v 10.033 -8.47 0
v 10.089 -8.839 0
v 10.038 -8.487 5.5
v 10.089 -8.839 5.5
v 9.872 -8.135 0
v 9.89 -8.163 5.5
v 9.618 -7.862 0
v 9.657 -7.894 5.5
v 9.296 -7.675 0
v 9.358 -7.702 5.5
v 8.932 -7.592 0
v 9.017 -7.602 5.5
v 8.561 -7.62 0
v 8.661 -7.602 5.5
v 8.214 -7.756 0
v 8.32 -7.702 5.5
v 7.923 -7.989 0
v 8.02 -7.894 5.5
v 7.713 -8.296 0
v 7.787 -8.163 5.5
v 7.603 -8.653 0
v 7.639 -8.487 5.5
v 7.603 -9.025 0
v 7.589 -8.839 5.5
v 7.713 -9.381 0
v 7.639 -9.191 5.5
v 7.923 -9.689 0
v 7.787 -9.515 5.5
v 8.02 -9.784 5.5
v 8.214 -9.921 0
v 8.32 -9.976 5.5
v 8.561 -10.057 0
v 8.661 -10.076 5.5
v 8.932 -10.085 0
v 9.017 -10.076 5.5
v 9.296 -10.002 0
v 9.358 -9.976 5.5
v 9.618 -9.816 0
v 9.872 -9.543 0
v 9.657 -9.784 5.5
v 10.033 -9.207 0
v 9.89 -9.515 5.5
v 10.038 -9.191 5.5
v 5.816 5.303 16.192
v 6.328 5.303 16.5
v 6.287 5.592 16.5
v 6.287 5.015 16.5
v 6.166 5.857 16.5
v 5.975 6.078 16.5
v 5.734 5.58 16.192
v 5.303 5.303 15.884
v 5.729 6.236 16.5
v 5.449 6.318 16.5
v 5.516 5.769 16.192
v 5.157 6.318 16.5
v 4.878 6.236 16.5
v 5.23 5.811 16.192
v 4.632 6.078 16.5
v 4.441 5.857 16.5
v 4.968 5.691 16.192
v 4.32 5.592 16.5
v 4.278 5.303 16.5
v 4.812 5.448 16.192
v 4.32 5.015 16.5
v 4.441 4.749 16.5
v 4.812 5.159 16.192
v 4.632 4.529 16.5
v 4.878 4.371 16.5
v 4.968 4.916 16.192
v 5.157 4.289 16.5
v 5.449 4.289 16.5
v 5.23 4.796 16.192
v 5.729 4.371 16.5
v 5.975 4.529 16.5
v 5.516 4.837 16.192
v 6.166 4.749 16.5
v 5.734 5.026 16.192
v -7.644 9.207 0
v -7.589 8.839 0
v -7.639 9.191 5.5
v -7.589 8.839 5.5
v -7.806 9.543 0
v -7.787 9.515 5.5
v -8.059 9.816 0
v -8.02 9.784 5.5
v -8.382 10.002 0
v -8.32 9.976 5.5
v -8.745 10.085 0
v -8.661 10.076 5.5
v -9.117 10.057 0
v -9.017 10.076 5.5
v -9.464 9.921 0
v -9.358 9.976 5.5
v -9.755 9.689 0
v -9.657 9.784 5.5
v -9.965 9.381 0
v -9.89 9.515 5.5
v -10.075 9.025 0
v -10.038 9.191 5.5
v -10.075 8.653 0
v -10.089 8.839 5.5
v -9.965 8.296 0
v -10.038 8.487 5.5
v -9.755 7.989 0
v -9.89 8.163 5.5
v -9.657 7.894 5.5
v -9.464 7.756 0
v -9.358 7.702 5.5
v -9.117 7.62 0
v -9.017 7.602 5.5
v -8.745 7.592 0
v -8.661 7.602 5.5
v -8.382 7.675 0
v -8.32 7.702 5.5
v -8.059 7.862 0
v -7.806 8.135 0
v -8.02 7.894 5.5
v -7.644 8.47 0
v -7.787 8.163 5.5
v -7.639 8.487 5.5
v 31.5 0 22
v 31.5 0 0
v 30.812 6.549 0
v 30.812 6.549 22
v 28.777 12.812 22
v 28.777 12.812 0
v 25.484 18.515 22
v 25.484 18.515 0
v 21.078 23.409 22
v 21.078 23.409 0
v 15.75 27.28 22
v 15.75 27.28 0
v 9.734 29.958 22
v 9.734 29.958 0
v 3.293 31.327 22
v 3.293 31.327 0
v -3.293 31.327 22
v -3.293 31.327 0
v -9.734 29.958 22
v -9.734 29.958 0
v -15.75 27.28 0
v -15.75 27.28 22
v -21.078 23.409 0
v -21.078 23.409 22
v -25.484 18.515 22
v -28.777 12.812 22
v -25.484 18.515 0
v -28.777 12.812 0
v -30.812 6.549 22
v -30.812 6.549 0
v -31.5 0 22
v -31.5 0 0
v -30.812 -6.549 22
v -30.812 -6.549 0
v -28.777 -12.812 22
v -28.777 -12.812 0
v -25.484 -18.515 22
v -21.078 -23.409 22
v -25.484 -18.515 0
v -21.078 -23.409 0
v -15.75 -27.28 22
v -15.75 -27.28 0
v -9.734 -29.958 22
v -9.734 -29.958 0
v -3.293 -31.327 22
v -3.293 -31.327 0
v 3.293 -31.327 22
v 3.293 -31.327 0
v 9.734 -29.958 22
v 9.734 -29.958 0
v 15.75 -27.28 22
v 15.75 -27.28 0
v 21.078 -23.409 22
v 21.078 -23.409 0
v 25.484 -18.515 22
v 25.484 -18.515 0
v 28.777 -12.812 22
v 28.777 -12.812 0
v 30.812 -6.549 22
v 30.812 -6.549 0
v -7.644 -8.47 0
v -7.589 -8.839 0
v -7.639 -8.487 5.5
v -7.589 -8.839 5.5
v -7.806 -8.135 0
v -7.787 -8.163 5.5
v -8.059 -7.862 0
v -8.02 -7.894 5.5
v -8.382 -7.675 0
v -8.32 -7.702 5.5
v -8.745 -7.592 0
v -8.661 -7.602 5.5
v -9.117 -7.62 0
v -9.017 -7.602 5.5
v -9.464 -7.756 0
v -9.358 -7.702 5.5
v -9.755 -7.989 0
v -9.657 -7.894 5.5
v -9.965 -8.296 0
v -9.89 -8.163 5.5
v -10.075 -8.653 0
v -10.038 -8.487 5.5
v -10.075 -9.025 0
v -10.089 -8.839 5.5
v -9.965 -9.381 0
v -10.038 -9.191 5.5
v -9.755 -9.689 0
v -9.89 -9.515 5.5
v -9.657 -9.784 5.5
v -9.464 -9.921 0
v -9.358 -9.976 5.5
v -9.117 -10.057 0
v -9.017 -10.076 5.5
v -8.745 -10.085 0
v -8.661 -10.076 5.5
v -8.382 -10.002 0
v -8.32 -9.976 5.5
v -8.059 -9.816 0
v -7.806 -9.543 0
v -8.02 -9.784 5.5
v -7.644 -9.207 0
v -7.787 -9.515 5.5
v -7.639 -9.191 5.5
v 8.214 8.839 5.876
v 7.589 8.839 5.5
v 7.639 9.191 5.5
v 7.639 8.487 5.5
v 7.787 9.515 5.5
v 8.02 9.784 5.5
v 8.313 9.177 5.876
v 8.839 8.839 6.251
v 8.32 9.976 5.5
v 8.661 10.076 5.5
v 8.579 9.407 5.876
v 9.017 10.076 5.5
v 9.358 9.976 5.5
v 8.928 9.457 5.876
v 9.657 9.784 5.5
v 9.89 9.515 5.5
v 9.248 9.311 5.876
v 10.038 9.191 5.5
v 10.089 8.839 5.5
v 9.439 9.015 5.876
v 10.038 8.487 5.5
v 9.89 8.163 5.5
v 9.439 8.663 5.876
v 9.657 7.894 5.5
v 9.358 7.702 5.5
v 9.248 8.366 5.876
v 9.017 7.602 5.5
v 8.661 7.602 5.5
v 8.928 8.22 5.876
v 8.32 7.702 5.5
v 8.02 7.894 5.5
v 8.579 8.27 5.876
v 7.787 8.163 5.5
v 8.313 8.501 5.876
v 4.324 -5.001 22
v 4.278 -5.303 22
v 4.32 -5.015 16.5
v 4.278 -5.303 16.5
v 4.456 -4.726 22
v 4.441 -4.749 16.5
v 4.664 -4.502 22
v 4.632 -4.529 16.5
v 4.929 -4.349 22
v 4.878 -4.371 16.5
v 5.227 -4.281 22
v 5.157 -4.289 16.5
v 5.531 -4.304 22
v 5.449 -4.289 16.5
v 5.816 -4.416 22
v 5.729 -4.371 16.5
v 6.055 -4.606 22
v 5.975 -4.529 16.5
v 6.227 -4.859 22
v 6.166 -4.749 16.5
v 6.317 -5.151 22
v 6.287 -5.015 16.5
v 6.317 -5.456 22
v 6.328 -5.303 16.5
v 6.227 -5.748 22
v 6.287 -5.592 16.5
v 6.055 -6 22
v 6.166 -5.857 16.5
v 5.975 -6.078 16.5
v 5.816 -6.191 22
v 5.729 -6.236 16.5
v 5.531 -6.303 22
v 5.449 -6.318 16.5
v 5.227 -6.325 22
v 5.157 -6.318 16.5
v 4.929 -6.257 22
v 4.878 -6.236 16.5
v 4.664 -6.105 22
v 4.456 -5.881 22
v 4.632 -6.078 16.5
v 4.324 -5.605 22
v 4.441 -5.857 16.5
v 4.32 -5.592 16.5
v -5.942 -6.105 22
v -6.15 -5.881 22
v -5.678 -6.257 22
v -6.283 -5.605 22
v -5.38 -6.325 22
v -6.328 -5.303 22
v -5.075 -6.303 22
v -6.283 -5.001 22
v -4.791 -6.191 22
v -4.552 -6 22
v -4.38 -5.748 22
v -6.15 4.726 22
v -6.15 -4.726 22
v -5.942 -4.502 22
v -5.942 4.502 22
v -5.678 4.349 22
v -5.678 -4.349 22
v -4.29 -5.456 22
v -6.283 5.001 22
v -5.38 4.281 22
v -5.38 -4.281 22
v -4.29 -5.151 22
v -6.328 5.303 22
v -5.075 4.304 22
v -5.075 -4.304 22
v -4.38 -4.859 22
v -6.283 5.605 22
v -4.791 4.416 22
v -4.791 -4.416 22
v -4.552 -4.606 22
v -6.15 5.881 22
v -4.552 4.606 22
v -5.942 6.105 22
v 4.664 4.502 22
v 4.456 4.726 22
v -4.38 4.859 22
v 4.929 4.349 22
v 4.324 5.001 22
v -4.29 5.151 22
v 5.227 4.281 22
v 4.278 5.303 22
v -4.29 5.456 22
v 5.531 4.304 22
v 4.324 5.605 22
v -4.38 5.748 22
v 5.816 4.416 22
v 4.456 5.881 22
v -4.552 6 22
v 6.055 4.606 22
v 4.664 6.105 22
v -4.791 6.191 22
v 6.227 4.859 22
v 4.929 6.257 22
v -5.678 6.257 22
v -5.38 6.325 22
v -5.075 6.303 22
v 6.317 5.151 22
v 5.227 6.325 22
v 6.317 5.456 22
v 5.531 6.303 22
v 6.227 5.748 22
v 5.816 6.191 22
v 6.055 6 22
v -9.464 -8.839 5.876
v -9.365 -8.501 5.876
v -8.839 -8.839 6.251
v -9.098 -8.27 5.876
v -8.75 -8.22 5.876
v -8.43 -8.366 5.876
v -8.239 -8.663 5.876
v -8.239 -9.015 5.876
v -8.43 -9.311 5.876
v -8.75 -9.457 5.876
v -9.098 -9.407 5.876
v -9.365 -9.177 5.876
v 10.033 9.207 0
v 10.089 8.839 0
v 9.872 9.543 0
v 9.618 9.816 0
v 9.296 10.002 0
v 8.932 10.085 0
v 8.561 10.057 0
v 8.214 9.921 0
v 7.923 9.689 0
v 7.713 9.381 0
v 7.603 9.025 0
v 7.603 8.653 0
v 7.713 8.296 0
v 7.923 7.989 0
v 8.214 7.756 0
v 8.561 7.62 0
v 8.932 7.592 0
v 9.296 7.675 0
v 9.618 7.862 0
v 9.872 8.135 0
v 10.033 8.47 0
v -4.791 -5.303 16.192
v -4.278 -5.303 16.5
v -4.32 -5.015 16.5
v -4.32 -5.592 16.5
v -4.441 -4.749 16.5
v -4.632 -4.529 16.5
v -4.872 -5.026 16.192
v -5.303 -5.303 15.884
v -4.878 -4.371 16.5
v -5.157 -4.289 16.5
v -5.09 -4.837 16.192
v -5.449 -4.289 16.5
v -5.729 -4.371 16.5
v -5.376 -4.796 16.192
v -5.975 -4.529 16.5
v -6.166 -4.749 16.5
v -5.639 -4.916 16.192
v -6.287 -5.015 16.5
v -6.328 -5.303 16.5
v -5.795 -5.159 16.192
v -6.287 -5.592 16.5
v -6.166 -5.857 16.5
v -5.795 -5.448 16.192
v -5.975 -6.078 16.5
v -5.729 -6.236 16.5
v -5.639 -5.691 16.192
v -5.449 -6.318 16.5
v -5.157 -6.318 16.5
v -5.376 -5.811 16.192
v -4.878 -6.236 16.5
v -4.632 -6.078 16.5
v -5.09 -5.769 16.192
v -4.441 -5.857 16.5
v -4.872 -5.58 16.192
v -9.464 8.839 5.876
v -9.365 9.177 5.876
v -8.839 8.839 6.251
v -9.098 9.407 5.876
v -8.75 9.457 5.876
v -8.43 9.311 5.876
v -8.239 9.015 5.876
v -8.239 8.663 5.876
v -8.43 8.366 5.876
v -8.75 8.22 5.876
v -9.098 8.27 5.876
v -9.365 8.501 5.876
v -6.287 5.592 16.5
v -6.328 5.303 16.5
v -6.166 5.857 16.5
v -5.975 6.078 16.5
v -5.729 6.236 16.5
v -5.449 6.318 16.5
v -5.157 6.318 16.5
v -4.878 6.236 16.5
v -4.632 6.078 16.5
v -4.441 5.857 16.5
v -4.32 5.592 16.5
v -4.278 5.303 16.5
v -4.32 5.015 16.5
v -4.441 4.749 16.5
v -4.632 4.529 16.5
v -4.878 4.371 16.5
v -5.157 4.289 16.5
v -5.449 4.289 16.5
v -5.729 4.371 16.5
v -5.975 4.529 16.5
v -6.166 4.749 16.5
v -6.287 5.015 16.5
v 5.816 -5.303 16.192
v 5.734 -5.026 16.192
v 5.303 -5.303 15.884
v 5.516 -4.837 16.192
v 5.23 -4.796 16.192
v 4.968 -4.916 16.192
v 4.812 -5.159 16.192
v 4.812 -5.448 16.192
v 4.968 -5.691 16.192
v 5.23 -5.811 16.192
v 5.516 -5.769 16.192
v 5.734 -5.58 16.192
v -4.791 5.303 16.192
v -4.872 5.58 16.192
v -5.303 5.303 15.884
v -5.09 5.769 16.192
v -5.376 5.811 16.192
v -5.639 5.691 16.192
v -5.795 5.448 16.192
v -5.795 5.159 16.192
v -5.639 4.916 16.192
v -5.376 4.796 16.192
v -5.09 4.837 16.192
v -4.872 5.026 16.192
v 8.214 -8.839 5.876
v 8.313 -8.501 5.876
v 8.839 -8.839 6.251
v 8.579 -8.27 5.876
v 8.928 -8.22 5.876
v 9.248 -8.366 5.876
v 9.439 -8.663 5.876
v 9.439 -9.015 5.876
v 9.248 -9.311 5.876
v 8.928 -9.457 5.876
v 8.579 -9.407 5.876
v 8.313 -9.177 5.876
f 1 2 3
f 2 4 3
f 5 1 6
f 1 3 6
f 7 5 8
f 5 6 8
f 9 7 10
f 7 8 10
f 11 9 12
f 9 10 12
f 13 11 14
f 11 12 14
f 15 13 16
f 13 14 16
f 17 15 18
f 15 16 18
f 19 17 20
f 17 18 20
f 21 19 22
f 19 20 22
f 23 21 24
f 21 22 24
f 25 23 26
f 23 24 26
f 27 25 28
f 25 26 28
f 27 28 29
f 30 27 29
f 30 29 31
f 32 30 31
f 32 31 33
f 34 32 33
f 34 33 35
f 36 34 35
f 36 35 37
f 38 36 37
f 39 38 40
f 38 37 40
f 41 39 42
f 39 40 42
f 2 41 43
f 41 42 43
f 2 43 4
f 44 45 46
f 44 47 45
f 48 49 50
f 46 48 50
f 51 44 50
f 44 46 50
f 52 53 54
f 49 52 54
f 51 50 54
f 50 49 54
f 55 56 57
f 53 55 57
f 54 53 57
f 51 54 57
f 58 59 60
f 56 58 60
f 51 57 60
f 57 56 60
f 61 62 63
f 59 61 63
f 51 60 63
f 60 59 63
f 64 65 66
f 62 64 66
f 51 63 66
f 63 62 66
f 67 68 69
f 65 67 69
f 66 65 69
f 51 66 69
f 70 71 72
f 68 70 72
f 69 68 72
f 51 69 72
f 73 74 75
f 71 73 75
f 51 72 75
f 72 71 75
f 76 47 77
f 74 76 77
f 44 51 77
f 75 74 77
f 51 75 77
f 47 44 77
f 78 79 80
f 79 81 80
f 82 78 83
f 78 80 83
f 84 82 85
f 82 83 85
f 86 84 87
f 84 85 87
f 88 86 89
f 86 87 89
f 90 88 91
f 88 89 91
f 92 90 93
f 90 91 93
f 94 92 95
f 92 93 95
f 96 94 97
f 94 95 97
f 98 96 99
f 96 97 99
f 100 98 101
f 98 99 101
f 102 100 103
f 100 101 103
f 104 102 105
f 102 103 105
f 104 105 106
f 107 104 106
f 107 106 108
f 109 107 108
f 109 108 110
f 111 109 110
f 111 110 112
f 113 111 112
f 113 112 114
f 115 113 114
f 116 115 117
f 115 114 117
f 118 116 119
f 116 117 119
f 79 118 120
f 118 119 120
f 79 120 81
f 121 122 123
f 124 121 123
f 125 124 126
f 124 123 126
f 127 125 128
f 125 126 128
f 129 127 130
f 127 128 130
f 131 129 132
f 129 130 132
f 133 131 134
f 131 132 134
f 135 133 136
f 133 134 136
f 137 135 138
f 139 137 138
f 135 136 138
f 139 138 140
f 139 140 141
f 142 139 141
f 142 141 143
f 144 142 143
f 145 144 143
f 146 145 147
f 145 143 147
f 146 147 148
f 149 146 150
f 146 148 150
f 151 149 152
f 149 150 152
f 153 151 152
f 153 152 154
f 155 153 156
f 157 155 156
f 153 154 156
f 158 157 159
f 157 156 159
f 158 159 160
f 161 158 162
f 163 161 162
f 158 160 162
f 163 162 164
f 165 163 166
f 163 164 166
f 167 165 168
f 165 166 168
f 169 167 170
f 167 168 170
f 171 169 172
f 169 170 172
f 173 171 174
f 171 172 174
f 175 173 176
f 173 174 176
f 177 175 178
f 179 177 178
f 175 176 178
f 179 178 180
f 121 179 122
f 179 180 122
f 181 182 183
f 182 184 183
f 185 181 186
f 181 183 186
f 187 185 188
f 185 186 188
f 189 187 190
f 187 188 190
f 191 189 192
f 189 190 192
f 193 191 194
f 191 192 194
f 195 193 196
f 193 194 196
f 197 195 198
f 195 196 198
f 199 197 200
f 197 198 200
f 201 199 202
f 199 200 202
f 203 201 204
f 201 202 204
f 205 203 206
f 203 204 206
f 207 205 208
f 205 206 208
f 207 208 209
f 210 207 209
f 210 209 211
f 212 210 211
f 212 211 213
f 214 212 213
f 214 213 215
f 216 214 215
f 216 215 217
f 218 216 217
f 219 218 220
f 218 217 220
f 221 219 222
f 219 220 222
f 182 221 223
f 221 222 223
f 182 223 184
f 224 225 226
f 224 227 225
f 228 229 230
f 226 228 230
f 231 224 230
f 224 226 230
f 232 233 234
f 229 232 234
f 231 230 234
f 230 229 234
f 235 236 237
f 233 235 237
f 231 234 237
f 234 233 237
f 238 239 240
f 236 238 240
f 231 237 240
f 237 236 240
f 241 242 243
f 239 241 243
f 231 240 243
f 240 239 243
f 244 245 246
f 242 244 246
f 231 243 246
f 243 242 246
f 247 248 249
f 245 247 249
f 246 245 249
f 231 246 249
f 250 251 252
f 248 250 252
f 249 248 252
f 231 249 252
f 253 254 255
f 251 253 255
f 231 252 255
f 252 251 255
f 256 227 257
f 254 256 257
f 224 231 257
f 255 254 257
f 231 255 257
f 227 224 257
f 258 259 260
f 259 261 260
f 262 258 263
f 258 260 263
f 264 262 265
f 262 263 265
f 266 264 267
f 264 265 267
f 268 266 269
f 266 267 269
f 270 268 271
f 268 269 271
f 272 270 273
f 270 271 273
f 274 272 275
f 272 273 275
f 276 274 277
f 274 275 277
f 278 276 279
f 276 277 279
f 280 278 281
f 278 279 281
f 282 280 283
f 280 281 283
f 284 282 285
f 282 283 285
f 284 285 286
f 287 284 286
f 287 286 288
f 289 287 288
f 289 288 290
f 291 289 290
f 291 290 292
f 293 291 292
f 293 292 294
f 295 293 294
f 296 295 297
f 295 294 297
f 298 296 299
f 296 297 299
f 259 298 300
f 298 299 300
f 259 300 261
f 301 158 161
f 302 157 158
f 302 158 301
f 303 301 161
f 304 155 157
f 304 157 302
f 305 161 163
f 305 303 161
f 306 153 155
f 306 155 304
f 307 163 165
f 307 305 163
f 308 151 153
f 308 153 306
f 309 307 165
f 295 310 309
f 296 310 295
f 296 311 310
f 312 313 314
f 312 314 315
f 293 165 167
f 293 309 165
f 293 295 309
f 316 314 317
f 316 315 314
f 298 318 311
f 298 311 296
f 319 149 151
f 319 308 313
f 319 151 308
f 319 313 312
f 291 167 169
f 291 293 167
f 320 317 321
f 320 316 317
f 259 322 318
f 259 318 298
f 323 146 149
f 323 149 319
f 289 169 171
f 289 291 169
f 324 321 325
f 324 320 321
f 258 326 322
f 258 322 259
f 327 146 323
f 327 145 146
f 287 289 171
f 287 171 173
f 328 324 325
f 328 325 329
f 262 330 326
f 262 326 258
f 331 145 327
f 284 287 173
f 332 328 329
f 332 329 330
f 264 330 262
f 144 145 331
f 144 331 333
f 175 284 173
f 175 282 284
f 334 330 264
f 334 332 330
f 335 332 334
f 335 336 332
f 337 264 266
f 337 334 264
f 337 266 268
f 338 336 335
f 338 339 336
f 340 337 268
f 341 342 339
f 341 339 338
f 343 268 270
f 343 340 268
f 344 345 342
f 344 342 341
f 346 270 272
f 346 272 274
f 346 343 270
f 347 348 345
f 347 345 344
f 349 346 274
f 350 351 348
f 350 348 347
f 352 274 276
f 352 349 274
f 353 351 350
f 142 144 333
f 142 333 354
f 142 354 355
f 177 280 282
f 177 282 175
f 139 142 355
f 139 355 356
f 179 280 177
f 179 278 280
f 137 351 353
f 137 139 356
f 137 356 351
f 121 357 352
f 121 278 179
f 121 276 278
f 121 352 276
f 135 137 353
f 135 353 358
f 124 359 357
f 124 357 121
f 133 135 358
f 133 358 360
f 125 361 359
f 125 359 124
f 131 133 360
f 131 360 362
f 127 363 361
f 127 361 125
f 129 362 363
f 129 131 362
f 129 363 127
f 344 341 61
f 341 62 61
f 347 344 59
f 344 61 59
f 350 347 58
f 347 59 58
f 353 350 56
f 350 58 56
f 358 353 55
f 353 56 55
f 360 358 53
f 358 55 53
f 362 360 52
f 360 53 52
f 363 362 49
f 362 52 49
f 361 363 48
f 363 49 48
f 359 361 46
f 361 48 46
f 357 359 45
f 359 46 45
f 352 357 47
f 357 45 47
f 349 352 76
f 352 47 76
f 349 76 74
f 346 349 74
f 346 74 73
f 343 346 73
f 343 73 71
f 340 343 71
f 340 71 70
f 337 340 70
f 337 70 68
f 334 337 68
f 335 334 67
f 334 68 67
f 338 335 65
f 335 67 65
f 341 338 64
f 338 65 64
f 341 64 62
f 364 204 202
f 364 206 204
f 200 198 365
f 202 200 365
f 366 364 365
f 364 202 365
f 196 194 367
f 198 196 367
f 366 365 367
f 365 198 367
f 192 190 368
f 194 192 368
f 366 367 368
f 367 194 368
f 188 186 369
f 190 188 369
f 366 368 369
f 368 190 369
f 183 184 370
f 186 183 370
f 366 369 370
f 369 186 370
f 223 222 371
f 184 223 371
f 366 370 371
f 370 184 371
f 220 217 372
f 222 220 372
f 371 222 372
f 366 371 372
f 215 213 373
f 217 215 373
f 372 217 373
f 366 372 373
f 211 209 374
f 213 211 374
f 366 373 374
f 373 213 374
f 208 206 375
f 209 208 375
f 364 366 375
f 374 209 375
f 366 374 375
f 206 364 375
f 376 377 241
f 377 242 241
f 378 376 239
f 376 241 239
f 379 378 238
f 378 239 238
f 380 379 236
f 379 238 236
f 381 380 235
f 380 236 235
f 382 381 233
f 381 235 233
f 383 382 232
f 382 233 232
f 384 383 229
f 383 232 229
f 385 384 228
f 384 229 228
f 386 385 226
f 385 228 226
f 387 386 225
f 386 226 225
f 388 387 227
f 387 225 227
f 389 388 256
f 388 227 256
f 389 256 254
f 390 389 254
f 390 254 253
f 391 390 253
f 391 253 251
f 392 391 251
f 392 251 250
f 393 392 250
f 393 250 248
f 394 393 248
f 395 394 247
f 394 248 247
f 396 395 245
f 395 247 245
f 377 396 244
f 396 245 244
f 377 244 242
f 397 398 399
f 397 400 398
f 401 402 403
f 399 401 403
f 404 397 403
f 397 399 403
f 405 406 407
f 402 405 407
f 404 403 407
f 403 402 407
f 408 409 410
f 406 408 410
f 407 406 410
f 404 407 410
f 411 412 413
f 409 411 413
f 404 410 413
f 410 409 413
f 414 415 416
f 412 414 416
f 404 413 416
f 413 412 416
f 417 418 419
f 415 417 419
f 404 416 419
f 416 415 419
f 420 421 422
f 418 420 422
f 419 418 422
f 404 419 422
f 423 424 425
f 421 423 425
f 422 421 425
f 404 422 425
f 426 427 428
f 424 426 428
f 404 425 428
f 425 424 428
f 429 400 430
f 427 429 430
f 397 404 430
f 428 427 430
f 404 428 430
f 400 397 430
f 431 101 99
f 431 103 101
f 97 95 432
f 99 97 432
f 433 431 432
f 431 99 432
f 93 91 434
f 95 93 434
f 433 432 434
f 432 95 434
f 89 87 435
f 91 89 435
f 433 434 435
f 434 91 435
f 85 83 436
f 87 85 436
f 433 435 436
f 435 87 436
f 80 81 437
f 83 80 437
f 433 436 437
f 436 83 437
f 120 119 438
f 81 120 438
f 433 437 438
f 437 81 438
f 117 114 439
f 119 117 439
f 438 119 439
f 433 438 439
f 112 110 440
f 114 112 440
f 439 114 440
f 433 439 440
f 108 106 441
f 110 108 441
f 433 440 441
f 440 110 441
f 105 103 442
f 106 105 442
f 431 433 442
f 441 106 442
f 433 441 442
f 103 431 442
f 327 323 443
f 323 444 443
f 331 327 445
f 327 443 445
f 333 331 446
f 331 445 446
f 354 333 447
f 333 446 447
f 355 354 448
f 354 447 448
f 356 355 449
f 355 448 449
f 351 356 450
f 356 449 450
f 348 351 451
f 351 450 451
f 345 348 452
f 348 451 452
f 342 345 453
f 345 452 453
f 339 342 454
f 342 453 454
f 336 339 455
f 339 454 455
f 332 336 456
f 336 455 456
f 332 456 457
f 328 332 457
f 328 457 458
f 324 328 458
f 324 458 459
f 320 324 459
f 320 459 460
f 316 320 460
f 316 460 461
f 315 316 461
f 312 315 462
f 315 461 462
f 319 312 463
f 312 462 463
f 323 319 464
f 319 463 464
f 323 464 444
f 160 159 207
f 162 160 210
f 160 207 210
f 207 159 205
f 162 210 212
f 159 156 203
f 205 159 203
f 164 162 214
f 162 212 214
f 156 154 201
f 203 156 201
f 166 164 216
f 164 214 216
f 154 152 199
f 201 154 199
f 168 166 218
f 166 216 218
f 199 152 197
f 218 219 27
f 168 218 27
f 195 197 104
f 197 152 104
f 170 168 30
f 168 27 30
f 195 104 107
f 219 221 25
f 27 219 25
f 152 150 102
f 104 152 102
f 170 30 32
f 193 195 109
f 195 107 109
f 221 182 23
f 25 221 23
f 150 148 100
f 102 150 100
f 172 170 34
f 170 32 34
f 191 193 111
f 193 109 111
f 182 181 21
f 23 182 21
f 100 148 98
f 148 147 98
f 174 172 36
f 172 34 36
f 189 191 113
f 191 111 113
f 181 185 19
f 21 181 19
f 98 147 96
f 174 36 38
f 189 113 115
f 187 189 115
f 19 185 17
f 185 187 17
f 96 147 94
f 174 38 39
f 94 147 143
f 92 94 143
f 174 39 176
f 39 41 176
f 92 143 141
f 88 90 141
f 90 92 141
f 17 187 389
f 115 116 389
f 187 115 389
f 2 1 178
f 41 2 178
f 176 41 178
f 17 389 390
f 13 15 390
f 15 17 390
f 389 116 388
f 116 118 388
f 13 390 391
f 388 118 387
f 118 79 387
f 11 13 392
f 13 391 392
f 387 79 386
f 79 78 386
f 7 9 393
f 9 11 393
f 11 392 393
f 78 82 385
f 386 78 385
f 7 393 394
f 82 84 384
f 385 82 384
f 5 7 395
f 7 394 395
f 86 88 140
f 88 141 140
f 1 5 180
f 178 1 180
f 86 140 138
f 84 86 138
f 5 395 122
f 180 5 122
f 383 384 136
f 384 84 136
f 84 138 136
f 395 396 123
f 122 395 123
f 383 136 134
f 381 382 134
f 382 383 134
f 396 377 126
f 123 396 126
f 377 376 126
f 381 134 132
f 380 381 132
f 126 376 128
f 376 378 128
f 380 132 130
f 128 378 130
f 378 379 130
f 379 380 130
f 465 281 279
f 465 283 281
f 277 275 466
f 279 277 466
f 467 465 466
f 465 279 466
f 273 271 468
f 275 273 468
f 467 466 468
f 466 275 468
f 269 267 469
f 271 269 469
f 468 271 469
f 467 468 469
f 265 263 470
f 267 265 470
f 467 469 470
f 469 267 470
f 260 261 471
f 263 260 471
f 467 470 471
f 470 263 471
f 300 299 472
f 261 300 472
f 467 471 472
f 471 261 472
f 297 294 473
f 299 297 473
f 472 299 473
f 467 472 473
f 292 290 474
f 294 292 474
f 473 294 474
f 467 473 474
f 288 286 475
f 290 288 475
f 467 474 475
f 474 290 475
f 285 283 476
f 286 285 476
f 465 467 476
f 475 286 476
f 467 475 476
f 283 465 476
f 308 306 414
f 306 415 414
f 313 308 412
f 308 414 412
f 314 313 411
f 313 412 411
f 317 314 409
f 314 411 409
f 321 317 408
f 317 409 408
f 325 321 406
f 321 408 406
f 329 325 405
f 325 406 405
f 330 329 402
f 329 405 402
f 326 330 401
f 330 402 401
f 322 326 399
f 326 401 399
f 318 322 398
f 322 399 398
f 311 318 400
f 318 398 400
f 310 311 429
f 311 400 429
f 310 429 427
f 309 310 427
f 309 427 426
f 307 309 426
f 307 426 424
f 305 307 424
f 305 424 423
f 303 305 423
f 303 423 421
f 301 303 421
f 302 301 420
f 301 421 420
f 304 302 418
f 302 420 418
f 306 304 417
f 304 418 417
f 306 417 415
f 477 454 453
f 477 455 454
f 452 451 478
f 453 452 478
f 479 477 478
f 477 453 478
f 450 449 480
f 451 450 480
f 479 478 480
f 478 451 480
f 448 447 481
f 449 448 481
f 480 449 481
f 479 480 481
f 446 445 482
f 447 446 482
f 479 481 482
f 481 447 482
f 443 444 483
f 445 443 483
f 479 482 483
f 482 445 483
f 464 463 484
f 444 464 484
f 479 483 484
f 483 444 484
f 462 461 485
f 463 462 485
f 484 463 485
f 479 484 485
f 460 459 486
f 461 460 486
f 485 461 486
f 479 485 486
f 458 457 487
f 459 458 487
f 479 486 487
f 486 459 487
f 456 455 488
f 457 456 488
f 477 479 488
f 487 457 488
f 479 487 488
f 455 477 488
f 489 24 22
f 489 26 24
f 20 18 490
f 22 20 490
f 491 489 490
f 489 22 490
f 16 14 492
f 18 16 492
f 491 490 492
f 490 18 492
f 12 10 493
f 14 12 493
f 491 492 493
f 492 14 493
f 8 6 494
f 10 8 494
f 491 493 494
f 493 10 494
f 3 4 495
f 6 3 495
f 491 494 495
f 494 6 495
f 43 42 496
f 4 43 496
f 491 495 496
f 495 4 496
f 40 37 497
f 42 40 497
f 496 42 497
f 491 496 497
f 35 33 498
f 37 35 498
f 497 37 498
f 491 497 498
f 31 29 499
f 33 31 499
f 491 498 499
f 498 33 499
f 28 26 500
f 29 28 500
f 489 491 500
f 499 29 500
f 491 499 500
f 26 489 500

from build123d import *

# Parameters (mm, degrees)
SKETCH1_R                          = 31.5
BOSS_EXTRUDE1_DEPTH                = 22
TAP_DRILL_FOR_M2_5X0_45_TAP1_D     = 2.05
TAP_DRILL_FOR_M2_5X0_45_TAP1_DEPTH = 5.5
TAP_DRILL_FOR_M2_5X0_45_TAP1_TIP   = 0.615882135
TAP_DRILL_FOR_M3X0_5_TAP1_D        = 2.5
TAP_DRILL_FOR_M3X0_5_TAP1_DEPTH    = 5.5
TAP_DRILL_FOR_M3X0_5_TAP1_TIP      = 0.751075774


with BuildPart() as part:
    # Sketch1 → Boss-Extrude1 (new body)
    with BuildSketch(Plane.XY):
        Circle(SKETCH1_R)
    extrude(amount=BOSS_EXTRUDE1_DEPTH)

    # Tap Drill for M2.5x0.45 Tap1
    with Locations(Plane.XY.offset(22)):
        with Locations((-5.303300859, 5.303300859), (5.303300859, -5.303300859), (5.303300859, 5.303300859), (-5.303300859, -5.303300859)):
            Hole(TAP_DRILL_FOR_M2_5X0_45_TAP1_D / 2, depth=TAP_DRILL_FOR_M2_5X0_45_TAP1_DEPTH)
            with Locations((0, 0, -(TAP_DRILL_FOR_M2_5X0_45_TAP1_DEPTH + TAP_DRILL_FOR_M2_5X0_45_TAP1_TIP / 2))):  # 118° drill point
                Cone(0, TAP_DRILL_FOR_M2_5X0_45_TAP1_D / 2, TAP_DRILL_FOR_M2_5X0_45_TAP1_TIP, mode=Mode.SUBTRACT)

    # Tap Drill for M3x0.5 Tap1
    with Locations(Plane(origin=(0, 0, 0), x_dir=(-1, 0, 0), z_dir=(0, 0, -1))):
        with Locations((8.838834765, 8.838834765), (8.838834765, -8.838834765), (-8.838834765, 8.838834765), (-8.838834765, -8.838834765)):
            Hole(TAP_DRILL_FOR_M3X0_5_TAP1_D / 2, depth=TAP_DRILL_FOR_M3X0_5_TAP1_DEPTH)
            with Locations((0, 0, -(TAP_DRILL_FOR_M3X0_5_TAP1_DEPTH + TAP_DRILL_FOR_M3X0_5_TAP1_TIP / 2))):  # 118° drill point
                Cone(0, TAP_DRILL_FOR_M3X0_5_TAP1_D / 2, TAP_DRILL_FOR_M3X0_5_TAP1_TIP, mode=Mode.SUBTRACT)


solid = part.part
